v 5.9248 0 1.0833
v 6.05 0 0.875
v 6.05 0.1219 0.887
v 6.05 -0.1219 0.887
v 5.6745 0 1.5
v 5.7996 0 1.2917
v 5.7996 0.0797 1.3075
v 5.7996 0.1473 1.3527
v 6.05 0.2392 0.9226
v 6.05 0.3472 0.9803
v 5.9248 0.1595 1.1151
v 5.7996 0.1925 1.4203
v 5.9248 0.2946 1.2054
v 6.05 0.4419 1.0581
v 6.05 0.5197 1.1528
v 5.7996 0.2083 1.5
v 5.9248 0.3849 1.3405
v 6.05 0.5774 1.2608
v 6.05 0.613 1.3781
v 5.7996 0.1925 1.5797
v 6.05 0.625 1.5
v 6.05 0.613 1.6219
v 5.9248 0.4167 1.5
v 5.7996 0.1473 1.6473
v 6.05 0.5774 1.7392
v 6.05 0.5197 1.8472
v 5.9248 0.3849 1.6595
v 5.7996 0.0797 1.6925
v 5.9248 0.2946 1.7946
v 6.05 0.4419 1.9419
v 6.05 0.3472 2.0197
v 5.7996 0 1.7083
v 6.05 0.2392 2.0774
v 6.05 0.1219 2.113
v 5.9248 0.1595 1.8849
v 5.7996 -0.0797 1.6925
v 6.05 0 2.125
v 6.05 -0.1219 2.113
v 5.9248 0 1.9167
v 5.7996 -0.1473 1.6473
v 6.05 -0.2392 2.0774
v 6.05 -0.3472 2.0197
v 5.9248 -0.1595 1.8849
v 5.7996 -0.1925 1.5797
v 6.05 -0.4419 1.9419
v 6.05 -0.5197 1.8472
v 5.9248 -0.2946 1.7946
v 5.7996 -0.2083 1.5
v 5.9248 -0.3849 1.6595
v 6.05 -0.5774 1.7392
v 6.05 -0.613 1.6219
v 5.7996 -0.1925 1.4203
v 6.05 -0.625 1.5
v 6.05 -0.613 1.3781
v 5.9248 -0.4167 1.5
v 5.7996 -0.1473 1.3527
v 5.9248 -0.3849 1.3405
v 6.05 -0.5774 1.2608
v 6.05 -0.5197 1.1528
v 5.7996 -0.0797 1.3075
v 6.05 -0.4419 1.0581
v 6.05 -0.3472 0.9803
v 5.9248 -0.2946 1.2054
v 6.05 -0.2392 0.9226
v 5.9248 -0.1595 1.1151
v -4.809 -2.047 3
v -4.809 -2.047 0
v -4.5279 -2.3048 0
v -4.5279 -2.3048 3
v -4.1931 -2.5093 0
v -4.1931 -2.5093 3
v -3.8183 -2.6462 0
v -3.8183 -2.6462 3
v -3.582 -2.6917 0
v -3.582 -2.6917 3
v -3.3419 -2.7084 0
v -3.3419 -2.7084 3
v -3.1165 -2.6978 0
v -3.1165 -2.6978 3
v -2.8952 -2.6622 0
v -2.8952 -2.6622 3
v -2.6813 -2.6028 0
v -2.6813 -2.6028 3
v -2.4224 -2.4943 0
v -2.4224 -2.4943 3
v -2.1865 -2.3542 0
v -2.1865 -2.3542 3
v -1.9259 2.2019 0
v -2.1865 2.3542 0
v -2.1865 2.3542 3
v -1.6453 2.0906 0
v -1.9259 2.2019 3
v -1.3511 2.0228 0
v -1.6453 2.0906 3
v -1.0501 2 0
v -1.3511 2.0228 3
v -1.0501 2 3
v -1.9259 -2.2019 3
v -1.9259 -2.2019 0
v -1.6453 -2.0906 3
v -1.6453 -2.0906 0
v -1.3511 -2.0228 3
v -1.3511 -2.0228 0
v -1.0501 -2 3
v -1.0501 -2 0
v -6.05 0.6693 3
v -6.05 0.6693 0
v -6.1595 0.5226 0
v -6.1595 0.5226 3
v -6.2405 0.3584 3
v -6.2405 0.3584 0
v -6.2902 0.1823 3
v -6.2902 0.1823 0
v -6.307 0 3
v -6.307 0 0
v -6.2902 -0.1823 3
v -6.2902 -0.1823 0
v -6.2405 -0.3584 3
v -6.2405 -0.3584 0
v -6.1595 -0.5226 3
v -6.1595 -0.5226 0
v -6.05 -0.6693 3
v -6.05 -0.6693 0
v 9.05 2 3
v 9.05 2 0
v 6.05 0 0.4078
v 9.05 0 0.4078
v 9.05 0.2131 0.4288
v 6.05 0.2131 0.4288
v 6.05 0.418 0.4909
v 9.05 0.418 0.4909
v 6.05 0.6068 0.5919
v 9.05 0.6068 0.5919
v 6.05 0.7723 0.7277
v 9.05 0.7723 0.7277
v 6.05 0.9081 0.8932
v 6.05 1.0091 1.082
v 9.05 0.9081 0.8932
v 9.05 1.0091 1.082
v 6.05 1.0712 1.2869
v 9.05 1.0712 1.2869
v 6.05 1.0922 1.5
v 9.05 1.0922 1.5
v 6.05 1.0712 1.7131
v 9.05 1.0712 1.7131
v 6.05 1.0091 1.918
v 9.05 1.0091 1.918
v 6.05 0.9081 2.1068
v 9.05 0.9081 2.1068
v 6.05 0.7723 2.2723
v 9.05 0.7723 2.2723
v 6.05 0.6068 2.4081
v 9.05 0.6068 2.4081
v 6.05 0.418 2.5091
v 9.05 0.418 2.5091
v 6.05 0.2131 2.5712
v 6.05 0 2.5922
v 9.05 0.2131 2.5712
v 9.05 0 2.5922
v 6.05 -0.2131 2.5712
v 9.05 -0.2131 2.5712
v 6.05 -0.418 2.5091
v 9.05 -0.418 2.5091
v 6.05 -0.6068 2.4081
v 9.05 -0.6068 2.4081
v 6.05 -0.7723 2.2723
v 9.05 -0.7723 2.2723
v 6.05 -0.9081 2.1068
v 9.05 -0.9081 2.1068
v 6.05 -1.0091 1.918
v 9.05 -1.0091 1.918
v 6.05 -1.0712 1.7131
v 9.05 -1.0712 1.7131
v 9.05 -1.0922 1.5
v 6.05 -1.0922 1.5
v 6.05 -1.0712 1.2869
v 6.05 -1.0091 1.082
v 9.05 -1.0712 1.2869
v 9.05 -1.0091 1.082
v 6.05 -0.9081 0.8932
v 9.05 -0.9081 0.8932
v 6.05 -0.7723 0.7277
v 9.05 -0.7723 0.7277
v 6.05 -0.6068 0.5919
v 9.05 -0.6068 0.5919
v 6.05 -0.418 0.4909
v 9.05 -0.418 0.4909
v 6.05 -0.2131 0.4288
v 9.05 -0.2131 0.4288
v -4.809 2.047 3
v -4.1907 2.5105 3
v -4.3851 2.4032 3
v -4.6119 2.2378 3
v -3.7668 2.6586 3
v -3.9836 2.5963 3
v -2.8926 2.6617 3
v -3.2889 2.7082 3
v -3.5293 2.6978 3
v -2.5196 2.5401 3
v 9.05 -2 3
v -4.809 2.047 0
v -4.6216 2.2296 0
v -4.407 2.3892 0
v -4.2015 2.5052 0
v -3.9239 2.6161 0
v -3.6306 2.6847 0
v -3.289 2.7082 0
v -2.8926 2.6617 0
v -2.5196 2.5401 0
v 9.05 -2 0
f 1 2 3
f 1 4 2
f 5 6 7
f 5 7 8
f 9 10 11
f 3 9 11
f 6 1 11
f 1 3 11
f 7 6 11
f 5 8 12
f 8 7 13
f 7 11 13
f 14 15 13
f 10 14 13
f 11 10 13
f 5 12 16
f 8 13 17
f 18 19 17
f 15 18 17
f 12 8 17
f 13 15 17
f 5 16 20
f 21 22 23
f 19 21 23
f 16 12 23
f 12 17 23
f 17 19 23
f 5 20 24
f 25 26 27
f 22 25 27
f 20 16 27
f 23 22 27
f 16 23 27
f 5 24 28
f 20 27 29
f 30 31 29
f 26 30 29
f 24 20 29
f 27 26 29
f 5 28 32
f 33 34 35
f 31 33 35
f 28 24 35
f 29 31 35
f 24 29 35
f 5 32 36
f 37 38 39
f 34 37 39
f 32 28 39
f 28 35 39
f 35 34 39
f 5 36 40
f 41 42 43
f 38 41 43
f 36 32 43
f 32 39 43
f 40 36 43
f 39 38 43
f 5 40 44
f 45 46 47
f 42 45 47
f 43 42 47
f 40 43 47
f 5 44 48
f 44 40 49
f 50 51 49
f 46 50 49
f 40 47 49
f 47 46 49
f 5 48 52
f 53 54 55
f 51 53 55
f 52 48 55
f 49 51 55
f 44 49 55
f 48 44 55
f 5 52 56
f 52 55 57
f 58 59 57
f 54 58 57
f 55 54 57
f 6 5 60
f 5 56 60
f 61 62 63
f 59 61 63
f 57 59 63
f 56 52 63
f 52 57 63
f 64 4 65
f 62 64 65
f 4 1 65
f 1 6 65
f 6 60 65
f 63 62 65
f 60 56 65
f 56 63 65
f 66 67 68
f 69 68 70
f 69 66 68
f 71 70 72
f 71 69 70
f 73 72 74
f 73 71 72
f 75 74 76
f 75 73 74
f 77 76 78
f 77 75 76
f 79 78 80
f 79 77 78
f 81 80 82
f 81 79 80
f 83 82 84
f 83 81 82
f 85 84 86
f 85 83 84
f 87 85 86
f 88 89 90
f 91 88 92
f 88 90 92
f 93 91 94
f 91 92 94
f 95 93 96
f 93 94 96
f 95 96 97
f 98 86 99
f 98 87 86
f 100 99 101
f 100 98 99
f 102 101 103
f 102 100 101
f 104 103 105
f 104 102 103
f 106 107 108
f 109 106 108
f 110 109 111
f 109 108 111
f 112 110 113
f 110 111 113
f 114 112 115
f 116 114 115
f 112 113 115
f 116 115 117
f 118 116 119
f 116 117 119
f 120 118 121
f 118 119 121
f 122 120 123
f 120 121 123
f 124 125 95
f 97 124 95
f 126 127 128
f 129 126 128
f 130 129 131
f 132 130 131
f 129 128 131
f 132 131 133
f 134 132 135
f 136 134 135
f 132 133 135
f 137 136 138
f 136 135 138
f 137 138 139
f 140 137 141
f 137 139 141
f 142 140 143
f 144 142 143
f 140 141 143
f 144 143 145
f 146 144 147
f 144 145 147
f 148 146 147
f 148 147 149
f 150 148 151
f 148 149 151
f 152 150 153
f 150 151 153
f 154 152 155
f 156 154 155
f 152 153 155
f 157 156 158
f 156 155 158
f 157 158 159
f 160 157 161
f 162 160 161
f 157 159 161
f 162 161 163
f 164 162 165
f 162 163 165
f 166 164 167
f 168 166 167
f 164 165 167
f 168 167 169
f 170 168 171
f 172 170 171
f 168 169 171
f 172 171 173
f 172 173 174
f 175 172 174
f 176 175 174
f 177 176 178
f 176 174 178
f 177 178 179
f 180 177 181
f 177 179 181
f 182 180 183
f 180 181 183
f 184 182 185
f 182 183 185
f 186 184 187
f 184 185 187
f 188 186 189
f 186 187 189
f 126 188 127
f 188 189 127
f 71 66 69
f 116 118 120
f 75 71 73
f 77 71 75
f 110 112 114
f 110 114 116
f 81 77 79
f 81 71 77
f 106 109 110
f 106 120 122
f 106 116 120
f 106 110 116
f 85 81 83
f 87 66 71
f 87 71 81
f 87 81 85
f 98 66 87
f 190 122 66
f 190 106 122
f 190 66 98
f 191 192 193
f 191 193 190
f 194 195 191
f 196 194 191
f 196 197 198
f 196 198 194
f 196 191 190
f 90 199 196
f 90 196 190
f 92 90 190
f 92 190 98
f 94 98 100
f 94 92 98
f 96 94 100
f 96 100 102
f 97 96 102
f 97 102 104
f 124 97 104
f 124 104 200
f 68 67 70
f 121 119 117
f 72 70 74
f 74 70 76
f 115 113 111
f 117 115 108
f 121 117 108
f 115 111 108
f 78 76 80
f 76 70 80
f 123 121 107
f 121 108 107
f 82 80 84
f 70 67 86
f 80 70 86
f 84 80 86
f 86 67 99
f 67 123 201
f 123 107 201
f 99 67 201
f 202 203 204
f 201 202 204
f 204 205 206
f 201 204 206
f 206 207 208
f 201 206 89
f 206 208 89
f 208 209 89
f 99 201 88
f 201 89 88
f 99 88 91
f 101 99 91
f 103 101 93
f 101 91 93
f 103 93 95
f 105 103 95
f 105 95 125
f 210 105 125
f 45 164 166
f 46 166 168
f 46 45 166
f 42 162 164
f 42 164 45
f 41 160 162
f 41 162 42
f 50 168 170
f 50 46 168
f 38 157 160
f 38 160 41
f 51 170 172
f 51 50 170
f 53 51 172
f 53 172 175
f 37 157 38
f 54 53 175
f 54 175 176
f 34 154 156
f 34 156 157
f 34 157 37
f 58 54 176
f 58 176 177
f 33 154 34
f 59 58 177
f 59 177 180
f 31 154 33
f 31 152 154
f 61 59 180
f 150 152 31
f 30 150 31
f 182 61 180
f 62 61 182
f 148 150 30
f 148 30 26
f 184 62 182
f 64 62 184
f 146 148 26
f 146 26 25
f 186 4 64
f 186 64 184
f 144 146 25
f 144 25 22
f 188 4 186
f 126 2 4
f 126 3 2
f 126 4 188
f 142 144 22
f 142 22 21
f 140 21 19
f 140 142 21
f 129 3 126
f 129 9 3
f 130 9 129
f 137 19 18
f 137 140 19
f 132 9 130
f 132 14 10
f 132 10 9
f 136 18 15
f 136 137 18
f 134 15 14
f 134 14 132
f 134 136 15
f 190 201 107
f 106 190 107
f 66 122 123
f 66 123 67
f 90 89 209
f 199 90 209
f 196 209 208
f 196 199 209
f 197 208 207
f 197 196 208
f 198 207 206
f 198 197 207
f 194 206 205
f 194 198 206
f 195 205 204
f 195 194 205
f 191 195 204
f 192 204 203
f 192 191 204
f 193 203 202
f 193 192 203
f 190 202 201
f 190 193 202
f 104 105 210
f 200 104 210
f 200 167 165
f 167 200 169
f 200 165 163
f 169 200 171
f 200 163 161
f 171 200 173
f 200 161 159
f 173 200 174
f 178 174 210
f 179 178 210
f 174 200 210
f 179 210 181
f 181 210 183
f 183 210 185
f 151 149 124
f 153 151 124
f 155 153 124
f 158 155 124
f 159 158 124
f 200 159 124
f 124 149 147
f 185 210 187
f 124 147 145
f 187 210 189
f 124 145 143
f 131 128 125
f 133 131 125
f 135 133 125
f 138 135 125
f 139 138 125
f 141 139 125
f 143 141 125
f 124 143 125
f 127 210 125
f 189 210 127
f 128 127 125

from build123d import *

# Parameters (mm, degrees)
BOSS_EXTRUDE1_DEPTH     = 3
FILLET2_R               = 2
FILLET3_R               = 2
M1_6_TAPPED_HOLE1_D     = 1.25
M1_6_TAPPED_HOLE1_DEPTH = 3
M1_6_TAPPED_HOLE1_TIP   = 0.375537887
SKETCH5_R               = 1.0922
CUT_EXTRUDE1_DEPTH      = 3


with BuildPart() as part:
    # Sketch1 → Boss-Extrude1 (new body)
    with BuildSketch(Plane.XY):
        with BuildLine():
            Line((-3.05, 2), (-3.05, 4))
            Line((-3.05, 4), (-6.05, 0.669251394))
            ThreePointArc((-6.05, 0.669251394), (-6.30696395, 0), (-6.05, -0.669251394))
            Line((-6.05, -0.669251394), (-3.05, -4))
            Line((-3.05, -4), (-3.05, -2))
            Line((-3.05, -2), (3.05, -2))
            Line((3.05, -2), (9.05, -2))
            Line((9.05, -2), (9.05, 2))
            Line((9.05, 2), (3.05, 2))
            Line((3.05, 2), (-3.05, 2))
        make_face()
    extrude(amount=BOSS_EXTRUDE1_DEPTH)

    # Fillet2
    fillet2_edges = [part.edges().sort_by_distance(p)[0] for p in [
        (-3.05, -2, 1.5),
        (-3.05, 2, 1.5),
    ]]
    fillet(fillet2_edges, radius=FILLET2_R - 0.0001)  # a hair under: the kernel refuses the full size

    # Fillet3
    fillet3_edges = [part.edges().sort_by_distance(p)[0] for p in [
        (-3.05, 4, 1.5),
        (-3.05, -4, 1.5),
    ]]
    fillet(fillet3_edges, radius=FILLET3_R)

    # M1.6 Tapped Hole1
    with Locations(Plane(origin=(9.05, 0, 0), x_dir=(0, 0, -1), z_dir=(1, 0, 0))):
        with Locations((-1.5, 0)):
            Hole(M1_6_TAPPED_HOLE1_D / 2, depth=M1_6_TAPPED_HOLE1_DEPTH)
            with Locations((0, 0, -(M1_6_TAPPED_HOLE1_DEPTH + M1_6_TAPPED_HOLE1_TIP / 2))):  # 118° drill point
                Cone(0, M1_6_TAPPED_HOLE1_D / 2, M1_6_TAPPED_HOLE1_TIP, mode=Mode.SUBTRACT)

    # Sketch5 → Cut-Extrude1 (cut)
    with BuildSketch(Plane(origin=(9.05, 0, 0), x_dir=(0, 0, -1), z_dir=(1, 0, 0))):
        with Locations((-1.5, 0)):
            Circle(SKETCH5_R)
    extrude(amount=-CUT_EXTRUDE1_DEPTH, mode=Mode.SUBTRACT)


solid = part.part
